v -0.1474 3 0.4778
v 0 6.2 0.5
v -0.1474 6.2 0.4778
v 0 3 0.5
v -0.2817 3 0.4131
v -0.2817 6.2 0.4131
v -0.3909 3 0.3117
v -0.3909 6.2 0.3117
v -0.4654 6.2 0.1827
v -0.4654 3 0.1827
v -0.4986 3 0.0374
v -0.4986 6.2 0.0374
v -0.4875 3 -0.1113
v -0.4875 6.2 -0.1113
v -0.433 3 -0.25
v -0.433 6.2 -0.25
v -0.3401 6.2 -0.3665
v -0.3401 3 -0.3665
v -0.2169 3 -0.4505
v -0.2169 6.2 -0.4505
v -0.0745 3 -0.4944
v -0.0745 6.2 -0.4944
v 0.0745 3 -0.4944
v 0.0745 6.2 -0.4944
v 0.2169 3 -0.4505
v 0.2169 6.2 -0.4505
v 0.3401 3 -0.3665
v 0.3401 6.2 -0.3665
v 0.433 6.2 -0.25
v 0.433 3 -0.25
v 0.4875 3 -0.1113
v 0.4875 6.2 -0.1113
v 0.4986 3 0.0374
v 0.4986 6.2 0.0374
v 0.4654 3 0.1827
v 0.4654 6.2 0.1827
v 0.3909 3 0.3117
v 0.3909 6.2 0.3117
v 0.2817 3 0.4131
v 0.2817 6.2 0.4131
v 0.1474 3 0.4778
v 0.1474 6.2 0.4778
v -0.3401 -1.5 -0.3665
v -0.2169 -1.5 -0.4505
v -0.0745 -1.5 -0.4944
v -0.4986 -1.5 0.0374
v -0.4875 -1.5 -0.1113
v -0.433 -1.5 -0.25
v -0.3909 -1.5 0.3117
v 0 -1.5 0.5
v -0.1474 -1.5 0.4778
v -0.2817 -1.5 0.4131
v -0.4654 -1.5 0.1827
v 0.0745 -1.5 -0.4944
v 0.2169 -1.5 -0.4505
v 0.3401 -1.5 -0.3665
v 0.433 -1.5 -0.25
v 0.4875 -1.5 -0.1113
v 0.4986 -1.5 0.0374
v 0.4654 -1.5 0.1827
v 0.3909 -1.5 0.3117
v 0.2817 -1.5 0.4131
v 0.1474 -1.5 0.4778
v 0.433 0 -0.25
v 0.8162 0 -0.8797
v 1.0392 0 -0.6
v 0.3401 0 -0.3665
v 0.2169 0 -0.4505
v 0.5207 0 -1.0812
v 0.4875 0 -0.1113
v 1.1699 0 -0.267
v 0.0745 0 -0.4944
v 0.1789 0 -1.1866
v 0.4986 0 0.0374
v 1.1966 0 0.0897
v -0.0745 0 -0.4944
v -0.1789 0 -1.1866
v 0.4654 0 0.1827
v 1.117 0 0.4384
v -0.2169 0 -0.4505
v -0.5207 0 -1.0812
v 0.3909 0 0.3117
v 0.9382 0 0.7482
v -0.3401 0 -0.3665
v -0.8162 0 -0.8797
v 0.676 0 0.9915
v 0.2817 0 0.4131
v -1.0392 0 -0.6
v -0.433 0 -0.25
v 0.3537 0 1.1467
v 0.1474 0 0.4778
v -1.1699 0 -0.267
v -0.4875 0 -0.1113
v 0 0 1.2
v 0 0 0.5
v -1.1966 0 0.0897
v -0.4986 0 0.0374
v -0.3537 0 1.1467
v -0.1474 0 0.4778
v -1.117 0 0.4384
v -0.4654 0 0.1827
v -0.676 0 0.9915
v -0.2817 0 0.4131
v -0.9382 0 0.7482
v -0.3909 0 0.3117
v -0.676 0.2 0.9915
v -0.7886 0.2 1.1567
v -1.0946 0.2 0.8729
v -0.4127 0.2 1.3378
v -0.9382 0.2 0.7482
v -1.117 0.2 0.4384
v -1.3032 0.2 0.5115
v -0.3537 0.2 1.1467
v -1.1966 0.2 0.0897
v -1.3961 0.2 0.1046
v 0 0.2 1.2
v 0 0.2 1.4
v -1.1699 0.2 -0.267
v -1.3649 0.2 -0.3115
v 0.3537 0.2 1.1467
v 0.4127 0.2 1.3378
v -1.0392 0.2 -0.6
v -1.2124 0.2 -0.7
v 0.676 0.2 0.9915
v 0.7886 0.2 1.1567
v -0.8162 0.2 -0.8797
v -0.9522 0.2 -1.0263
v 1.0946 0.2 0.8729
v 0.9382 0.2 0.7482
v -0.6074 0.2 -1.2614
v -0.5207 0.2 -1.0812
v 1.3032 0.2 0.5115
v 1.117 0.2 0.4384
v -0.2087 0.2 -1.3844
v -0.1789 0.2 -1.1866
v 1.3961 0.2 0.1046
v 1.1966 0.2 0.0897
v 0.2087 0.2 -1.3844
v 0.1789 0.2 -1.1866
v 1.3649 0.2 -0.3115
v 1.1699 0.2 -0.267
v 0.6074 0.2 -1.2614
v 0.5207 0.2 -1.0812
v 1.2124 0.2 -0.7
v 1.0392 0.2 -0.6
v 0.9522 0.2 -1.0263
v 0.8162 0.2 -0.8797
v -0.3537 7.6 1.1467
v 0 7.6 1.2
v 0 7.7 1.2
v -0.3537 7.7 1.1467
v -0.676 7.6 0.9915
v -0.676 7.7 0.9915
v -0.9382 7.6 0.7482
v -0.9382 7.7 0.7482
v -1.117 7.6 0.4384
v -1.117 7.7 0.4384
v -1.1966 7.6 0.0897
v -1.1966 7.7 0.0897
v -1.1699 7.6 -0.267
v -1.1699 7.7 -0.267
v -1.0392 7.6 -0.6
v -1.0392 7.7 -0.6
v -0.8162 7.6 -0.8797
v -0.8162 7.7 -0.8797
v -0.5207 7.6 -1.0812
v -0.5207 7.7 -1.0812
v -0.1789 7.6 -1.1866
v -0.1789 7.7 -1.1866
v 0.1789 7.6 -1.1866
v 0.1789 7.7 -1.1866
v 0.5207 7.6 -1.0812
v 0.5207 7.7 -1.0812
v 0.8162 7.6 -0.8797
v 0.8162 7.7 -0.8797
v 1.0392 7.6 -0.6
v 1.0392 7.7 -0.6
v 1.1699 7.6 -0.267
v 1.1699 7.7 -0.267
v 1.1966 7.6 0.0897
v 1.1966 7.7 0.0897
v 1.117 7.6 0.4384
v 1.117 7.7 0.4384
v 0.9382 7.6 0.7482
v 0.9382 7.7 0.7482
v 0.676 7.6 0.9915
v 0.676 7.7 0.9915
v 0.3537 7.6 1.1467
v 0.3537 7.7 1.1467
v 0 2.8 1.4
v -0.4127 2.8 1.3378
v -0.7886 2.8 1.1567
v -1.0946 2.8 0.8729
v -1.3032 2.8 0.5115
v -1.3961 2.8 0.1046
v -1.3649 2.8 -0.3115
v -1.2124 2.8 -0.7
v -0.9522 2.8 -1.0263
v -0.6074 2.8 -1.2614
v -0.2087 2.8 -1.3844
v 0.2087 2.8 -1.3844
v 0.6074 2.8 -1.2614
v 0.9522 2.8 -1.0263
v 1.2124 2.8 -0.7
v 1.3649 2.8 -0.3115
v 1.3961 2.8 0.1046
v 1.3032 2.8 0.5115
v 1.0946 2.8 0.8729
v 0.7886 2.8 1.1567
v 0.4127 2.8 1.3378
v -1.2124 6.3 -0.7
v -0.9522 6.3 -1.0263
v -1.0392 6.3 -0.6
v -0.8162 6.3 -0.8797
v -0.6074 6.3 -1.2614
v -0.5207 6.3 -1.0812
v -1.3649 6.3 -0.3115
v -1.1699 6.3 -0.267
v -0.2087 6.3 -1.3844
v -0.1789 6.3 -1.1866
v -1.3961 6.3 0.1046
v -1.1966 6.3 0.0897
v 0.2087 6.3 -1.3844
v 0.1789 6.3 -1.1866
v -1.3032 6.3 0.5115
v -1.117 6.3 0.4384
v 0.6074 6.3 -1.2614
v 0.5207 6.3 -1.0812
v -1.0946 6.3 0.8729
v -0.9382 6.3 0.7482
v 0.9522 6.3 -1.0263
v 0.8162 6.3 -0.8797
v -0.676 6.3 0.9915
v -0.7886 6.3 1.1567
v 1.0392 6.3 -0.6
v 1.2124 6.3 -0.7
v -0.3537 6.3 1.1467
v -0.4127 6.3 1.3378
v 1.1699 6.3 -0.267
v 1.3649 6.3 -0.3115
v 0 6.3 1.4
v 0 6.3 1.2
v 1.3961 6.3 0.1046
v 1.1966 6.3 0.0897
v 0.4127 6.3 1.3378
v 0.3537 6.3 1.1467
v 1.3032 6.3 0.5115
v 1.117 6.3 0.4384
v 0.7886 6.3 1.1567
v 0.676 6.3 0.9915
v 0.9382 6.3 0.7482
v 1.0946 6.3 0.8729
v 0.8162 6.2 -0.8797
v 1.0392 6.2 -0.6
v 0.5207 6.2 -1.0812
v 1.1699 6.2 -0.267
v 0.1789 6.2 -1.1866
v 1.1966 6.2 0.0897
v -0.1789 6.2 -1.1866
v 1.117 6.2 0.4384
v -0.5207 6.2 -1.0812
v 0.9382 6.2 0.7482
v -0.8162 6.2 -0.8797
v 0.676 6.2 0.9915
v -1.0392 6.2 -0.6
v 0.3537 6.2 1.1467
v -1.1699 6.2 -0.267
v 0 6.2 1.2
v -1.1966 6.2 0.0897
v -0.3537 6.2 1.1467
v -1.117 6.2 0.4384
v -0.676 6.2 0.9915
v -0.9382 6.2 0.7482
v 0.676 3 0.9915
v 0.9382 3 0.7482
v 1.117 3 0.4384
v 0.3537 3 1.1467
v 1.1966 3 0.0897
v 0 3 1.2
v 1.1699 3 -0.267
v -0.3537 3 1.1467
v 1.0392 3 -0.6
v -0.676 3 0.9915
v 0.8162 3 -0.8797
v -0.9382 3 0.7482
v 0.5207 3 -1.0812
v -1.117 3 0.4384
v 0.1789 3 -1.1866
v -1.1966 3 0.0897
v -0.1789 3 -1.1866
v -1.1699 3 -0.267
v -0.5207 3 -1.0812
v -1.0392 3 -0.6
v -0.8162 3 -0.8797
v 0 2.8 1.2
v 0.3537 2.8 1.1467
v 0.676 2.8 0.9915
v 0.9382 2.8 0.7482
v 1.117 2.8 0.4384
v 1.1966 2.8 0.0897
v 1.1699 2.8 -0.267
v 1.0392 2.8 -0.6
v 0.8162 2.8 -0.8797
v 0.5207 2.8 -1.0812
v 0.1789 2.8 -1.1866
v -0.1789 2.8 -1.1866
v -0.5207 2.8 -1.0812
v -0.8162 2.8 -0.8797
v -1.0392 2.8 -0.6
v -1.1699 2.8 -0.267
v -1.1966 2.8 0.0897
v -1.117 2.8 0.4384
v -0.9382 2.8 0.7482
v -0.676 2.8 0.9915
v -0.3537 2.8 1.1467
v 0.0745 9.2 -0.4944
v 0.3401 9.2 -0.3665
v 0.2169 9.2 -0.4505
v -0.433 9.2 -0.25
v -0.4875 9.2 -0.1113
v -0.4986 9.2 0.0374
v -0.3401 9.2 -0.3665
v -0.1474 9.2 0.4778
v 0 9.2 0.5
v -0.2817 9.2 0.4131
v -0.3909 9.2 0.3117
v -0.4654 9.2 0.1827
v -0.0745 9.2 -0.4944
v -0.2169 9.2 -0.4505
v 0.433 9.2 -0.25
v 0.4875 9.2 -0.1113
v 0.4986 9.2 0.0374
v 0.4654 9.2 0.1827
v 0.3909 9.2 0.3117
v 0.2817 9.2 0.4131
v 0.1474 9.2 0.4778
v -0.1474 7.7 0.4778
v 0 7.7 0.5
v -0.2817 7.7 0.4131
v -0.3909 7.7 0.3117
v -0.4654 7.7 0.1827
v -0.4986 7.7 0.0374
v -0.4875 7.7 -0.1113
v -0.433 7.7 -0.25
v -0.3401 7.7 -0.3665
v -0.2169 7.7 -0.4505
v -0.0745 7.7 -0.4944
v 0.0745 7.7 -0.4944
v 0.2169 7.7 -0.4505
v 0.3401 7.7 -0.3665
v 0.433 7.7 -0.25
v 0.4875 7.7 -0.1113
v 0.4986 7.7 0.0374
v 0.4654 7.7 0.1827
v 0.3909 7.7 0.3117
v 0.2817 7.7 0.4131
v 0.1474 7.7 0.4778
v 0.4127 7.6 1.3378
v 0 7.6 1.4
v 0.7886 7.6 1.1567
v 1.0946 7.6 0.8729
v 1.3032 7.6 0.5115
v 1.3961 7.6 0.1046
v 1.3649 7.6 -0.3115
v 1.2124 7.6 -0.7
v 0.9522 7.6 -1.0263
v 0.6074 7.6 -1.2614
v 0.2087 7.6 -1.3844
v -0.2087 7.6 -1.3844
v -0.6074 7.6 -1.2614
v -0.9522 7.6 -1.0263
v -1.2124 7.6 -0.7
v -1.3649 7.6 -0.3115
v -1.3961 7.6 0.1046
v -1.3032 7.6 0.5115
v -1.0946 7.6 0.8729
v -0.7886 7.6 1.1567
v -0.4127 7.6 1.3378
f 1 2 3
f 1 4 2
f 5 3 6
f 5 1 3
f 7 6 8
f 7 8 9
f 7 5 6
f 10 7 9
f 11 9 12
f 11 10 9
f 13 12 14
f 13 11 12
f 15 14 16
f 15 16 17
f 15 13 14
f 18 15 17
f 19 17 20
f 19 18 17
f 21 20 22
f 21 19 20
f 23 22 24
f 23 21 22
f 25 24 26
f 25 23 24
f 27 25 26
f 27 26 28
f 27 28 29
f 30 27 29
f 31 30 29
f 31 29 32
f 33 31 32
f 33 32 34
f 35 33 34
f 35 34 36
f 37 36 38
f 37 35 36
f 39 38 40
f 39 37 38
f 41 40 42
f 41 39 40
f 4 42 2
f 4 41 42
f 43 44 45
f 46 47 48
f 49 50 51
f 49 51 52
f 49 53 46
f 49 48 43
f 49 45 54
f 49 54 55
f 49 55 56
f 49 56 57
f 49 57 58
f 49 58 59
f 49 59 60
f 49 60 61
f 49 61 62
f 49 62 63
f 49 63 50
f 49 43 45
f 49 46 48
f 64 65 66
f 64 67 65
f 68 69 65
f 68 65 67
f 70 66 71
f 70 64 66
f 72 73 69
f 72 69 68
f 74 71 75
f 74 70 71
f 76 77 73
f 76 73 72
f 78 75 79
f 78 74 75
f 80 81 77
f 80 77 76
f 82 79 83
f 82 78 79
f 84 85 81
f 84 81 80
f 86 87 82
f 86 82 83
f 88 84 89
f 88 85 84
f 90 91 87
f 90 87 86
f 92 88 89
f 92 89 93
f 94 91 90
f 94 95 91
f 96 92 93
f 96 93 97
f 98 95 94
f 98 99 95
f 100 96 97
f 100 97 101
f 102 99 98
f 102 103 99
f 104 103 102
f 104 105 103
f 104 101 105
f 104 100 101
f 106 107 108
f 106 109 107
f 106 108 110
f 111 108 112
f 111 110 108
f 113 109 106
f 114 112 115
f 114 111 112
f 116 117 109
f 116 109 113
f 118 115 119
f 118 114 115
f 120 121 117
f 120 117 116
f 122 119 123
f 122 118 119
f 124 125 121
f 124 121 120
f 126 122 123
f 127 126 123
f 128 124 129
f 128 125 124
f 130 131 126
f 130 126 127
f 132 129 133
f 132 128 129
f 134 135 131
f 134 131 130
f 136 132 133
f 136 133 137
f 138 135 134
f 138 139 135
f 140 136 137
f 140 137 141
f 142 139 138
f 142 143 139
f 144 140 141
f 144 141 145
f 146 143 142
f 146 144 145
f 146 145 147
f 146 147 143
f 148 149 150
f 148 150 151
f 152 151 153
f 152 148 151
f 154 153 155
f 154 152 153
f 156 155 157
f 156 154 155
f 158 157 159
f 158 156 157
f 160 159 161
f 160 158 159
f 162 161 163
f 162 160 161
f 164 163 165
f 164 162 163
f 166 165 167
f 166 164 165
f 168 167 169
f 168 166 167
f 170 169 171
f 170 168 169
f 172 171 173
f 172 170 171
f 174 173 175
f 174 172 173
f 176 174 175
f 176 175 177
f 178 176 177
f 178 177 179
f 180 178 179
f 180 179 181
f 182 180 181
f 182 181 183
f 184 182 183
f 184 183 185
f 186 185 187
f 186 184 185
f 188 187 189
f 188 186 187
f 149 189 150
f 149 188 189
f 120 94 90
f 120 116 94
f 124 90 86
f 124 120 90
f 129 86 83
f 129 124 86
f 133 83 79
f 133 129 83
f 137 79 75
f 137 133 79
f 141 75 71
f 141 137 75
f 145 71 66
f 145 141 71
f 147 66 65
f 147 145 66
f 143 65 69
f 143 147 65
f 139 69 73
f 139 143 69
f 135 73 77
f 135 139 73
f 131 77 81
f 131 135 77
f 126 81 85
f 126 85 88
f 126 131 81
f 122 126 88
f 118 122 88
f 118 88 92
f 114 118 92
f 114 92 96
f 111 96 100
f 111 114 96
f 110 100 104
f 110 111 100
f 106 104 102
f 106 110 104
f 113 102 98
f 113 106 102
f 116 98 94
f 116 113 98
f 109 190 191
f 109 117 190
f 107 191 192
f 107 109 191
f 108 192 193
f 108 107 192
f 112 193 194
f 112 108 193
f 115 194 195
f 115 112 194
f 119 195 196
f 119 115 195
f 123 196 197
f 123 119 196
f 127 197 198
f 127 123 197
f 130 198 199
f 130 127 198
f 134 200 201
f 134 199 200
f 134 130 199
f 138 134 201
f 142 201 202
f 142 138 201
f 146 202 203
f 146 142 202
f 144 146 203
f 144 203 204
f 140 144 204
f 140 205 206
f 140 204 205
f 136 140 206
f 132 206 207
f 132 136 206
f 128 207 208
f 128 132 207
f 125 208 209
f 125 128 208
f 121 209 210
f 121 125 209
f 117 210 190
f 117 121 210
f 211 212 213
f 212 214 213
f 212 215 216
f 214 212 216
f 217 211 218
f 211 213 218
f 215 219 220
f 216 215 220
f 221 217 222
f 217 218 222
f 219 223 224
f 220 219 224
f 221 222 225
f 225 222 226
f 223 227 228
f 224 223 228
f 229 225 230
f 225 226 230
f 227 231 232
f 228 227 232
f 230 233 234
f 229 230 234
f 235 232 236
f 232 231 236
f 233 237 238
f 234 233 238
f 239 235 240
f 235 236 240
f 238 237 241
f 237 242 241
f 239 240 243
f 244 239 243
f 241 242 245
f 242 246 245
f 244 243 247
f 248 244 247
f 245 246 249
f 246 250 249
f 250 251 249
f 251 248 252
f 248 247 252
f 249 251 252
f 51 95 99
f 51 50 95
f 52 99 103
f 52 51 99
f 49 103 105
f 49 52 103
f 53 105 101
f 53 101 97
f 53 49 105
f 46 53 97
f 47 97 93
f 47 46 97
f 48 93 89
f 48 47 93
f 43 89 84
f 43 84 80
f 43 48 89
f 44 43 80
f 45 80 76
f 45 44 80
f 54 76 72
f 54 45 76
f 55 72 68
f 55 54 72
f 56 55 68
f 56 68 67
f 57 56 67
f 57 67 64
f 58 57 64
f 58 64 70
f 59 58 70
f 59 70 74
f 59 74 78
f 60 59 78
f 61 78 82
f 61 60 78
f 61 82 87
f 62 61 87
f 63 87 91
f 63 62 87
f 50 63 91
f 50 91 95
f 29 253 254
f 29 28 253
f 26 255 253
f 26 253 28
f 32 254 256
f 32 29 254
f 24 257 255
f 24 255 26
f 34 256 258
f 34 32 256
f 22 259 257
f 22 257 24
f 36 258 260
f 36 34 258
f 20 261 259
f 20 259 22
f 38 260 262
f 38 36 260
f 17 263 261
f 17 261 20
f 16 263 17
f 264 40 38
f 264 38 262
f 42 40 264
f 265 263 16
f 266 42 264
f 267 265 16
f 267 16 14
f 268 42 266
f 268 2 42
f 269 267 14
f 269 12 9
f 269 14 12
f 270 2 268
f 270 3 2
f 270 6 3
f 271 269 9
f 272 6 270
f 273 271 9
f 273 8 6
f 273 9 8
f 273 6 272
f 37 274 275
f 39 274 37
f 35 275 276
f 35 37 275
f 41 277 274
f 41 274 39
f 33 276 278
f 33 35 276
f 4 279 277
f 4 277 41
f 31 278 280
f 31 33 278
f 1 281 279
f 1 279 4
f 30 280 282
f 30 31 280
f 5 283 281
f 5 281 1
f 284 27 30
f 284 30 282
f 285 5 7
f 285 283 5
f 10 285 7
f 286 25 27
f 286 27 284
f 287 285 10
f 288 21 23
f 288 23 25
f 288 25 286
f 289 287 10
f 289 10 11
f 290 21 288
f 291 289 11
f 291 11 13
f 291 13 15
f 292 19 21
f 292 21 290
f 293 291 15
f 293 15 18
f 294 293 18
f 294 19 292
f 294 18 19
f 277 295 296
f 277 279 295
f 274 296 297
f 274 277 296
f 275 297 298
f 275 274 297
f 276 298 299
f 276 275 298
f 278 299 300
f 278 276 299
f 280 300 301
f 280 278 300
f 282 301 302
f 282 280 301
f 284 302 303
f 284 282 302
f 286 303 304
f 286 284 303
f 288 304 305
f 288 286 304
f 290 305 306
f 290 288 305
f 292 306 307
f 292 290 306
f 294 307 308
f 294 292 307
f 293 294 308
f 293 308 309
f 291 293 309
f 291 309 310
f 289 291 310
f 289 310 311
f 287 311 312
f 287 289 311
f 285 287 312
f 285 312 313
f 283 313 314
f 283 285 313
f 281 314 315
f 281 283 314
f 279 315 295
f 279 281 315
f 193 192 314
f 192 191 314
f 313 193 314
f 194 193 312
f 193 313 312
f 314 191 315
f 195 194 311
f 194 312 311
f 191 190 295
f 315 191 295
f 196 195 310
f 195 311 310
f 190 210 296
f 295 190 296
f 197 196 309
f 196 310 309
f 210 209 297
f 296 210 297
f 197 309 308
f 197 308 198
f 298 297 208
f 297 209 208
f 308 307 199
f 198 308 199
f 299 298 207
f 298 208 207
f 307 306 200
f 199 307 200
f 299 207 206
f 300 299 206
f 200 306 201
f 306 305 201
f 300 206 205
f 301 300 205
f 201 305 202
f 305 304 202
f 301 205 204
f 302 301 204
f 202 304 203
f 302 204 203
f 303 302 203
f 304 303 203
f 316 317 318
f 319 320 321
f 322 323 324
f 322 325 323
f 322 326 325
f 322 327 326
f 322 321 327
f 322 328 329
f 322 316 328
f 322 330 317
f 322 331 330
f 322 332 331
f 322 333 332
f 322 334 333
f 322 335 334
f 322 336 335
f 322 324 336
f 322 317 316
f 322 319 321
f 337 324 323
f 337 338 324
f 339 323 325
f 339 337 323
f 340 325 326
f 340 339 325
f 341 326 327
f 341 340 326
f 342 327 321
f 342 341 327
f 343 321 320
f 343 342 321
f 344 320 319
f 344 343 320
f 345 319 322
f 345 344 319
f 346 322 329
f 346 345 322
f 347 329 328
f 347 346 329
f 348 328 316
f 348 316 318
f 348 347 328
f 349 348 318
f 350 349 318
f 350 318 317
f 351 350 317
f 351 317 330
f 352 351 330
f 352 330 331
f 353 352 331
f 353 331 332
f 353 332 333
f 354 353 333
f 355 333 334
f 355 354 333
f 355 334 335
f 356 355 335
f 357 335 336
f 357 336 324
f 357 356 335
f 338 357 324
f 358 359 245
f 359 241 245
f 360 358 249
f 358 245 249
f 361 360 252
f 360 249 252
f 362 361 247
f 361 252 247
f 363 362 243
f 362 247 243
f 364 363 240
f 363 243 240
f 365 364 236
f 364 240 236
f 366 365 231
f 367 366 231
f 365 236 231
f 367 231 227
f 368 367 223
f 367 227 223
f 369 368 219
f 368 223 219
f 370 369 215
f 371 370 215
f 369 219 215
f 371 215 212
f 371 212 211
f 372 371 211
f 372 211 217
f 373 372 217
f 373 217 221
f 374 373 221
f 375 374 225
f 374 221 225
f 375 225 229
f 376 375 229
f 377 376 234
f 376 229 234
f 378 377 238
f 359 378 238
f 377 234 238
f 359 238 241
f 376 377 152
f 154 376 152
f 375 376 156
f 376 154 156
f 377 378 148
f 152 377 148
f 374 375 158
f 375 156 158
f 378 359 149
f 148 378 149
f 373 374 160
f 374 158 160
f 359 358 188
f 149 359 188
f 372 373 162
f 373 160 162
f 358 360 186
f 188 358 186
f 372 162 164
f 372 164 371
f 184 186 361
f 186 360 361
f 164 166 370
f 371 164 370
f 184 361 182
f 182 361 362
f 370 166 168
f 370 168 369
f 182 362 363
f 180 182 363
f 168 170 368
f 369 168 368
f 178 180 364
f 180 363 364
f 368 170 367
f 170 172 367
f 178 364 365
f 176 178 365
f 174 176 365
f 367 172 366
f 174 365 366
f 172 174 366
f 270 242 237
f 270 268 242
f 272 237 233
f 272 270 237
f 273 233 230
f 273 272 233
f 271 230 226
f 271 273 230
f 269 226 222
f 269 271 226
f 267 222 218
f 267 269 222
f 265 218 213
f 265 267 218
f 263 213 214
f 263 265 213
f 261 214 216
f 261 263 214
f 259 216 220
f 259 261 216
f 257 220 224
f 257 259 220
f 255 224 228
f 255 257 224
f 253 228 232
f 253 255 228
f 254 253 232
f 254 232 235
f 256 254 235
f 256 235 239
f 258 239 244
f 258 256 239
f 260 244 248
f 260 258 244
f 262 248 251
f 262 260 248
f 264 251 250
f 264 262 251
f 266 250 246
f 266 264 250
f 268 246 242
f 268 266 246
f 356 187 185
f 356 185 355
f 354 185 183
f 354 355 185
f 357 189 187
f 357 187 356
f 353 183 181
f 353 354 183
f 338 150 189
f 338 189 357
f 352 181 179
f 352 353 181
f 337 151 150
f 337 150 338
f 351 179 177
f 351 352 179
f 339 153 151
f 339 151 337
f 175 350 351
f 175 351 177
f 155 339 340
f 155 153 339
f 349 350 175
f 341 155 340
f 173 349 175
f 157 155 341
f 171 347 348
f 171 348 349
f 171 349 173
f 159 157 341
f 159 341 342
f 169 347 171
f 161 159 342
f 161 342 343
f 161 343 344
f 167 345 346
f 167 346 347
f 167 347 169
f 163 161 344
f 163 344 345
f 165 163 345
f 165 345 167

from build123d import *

# Parameters (mm, degrees)
F2_W = 0.2
F2_H = 0.2


with BuildPart() as f1:
    # F0 (on Right) → F1 (revolve)
    with BuildSketch(Plane.YZ):
        Polygon((-1.5, 0.5), (-1.5, 0), (9.2, 0), (9.2, 0.5), (7.7, 0.5), (7.7, 1.2), (6.2, 1.2), (6.2, 0.5), (3, 0.5), (3, 1.4), (0, 1.4), (0, 0.5), align=None)
    revolve(axis=Axis((0, 3.85, 0), (0, -1, 0)))

    # F2 (on Right) → F3 (revolve, cut)
    with BuildSketch(Plane.YZ):
        with Locations((0.1, 1.3)):
            Rectangle(F2_W, F2_H)
        with Locations((2.9, 1.3)):
            Rectangle(F2_W, F2_H)
    revolve(axis=Axis((0, 1.5, 0), (0, 1, 0)), mode=Mode.SUBTRACT)

    # F4 (on Right) → F5 (revolve)
    with BuildSketch(Plane.YZ):
        Polygon((6.3, 1.2), (6.7, 1.2), (7.6, 1.2), (7.6, 1.4), (6.3, 1.4), align=None)
    revolve(axis=Axis((0, 6.95, 0), (0, 1, 0)))


solid = f1.part
